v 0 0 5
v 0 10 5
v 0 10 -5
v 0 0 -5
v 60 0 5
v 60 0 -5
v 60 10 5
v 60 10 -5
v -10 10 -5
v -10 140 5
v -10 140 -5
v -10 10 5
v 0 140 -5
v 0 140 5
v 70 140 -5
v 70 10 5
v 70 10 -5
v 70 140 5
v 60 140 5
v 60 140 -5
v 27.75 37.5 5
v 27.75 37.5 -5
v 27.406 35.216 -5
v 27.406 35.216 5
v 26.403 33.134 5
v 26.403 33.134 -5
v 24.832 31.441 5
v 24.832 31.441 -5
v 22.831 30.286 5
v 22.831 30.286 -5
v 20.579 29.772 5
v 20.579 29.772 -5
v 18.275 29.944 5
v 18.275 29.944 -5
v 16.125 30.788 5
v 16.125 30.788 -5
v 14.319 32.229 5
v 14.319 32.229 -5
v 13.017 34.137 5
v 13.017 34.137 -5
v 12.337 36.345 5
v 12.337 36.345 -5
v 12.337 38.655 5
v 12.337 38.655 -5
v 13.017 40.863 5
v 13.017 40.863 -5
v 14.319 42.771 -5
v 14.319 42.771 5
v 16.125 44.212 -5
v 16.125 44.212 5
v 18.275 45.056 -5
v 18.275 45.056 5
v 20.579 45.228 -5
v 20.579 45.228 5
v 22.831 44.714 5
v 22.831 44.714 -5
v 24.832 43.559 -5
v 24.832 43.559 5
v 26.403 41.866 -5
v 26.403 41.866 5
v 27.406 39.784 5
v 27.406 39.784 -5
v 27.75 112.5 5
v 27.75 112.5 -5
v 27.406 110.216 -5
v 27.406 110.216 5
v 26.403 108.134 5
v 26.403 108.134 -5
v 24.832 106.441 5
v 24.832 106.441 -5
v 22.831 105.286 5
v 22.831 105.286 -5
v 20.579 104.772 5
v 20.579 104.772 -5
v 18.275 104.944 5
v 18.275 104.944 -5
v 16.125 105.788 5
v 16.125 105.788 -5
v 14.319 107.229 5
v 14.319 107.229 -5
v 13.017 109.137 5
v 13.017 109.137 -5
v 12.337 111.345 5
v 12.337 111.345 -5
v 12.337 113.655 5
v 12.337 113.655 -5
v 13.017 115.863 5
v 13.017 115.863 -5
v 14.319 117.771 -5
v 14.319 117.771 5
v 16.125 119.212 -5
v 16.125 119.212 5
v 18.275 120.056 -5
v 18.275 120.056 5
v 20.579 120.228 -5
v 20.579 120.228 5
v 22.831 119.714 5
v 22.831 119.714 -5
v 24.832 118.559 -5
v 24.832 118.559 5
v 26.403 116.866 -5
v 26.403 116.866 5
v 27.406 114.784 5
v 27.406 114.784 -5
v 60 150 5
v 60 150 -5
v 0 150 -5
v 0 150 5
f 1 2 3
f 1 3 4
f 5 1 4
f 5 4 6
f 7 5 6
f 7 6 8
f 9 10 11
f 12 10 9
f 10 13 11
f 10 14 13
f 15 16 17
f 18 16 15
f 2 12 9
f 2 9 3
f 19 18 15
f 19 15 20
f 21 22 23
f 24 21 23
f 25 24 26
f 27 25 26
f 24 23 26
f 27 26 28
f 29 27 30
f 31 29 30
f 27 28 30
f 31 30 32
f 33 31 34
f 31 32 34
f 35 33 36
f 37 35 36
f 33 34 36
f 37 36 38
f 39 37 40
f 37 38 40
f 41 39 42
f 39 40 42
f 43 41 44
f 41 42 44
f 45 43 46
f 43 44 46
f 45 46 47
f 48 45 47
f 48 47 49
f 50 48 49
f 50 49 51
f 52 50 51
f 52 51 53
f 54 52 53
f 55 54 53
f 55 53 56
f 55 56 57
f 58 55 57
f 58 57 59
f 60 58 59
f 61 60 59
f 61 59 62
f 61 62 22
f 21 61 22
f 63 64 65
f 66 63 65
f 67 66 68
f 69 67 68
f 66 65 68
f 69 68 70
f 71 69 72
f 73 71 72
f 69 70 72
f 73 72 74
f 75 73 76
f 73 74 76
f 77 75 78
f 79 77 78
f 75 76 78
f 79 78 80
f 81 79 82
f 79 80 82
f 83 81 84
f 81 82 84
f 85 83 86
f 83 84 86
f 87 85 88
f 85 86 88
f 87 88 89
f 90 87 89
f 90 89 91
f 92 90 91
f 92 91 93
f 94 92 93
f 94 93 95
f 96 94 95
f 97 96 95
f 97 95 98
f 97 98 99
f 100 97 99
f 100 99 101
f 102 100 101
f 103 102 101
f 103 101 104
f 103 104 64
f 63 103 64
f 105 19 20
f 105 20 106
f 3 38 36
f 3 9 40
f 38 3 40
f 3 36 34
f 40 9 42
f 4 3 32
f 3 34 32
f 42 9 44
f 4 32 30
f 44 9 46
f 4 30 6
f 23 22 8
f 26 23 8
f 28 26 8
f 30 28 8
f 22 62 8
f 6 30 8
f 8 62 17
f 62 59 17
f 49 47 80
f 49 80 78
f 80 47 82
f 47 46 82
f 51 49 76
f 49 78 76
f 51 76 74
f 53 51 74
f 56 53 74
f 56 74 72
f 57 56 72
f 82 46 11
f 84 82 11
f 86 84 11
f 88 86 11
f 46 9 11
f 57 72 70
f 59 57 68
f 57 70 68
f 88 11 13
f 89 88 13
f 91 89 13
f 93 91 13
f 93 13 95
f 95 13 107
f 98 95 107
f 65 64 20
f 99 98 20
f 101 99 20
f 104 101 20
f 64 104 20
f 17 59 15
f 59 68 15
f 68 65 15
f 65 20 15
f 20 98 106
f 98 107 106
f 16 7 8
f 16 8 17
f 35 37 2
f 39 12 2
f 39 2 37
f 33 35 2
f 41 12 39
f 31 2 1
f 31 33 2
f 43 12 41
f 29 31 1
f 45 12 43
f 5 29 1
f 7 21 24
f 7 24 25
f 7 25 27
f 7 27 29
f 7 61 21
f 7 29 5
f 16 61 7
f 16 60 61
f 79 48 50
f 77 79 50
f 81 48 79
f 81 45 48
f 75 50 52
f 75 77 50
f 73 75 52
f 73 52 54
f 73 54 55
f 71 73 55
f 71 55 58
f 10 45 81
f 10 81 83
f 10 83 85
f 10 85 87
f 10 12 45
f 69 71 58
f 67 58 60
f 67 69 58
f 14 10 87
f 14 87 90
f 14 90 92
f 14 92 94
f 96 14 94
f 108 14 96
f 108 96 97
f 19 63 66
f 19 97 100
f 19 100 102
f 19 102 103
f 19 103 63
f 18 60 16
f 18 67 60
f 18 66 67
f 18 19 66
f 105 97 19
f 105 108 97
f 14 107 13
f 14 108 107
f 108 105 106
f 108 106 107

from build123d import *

# Parameters (mm, degrees)
PAD_DEPTH    = 5
SKETCH001_R  = 7.75
POCKET_DEPTH = 10.001


with BuildPart() as part:
    # Sketch → Pad (new body, symmetric)
    with BuildSketch(Plane.XY):
        Polygon((-10, 140), (-10, 10), (0, 10), (0, 0), (60, 0), (60, 10), (70, 10), (70, 140), (60, 140), (60, 150), (0, 150), (0, 140), align=None)
    extrude(amount=PAD_DEPTH, both=True)

    # Sketch001 (on Face13 of Pad) → Pocket (cut, through all)
    with BuildSketch(Plane(origin=(0, 0, -5), x_dir=(1, 0, 0), z_dir=(0, 0, -1))):
        with Locations((20, -37.5)):
            Circle(SKETCH001_R)
        with Locations((20, -112.5)):
            Circle(SKETCH001_R)
    extrude(amount=-POCKET_DEPTH, mode=Mode.SUBTRACT)


solid = part.part
